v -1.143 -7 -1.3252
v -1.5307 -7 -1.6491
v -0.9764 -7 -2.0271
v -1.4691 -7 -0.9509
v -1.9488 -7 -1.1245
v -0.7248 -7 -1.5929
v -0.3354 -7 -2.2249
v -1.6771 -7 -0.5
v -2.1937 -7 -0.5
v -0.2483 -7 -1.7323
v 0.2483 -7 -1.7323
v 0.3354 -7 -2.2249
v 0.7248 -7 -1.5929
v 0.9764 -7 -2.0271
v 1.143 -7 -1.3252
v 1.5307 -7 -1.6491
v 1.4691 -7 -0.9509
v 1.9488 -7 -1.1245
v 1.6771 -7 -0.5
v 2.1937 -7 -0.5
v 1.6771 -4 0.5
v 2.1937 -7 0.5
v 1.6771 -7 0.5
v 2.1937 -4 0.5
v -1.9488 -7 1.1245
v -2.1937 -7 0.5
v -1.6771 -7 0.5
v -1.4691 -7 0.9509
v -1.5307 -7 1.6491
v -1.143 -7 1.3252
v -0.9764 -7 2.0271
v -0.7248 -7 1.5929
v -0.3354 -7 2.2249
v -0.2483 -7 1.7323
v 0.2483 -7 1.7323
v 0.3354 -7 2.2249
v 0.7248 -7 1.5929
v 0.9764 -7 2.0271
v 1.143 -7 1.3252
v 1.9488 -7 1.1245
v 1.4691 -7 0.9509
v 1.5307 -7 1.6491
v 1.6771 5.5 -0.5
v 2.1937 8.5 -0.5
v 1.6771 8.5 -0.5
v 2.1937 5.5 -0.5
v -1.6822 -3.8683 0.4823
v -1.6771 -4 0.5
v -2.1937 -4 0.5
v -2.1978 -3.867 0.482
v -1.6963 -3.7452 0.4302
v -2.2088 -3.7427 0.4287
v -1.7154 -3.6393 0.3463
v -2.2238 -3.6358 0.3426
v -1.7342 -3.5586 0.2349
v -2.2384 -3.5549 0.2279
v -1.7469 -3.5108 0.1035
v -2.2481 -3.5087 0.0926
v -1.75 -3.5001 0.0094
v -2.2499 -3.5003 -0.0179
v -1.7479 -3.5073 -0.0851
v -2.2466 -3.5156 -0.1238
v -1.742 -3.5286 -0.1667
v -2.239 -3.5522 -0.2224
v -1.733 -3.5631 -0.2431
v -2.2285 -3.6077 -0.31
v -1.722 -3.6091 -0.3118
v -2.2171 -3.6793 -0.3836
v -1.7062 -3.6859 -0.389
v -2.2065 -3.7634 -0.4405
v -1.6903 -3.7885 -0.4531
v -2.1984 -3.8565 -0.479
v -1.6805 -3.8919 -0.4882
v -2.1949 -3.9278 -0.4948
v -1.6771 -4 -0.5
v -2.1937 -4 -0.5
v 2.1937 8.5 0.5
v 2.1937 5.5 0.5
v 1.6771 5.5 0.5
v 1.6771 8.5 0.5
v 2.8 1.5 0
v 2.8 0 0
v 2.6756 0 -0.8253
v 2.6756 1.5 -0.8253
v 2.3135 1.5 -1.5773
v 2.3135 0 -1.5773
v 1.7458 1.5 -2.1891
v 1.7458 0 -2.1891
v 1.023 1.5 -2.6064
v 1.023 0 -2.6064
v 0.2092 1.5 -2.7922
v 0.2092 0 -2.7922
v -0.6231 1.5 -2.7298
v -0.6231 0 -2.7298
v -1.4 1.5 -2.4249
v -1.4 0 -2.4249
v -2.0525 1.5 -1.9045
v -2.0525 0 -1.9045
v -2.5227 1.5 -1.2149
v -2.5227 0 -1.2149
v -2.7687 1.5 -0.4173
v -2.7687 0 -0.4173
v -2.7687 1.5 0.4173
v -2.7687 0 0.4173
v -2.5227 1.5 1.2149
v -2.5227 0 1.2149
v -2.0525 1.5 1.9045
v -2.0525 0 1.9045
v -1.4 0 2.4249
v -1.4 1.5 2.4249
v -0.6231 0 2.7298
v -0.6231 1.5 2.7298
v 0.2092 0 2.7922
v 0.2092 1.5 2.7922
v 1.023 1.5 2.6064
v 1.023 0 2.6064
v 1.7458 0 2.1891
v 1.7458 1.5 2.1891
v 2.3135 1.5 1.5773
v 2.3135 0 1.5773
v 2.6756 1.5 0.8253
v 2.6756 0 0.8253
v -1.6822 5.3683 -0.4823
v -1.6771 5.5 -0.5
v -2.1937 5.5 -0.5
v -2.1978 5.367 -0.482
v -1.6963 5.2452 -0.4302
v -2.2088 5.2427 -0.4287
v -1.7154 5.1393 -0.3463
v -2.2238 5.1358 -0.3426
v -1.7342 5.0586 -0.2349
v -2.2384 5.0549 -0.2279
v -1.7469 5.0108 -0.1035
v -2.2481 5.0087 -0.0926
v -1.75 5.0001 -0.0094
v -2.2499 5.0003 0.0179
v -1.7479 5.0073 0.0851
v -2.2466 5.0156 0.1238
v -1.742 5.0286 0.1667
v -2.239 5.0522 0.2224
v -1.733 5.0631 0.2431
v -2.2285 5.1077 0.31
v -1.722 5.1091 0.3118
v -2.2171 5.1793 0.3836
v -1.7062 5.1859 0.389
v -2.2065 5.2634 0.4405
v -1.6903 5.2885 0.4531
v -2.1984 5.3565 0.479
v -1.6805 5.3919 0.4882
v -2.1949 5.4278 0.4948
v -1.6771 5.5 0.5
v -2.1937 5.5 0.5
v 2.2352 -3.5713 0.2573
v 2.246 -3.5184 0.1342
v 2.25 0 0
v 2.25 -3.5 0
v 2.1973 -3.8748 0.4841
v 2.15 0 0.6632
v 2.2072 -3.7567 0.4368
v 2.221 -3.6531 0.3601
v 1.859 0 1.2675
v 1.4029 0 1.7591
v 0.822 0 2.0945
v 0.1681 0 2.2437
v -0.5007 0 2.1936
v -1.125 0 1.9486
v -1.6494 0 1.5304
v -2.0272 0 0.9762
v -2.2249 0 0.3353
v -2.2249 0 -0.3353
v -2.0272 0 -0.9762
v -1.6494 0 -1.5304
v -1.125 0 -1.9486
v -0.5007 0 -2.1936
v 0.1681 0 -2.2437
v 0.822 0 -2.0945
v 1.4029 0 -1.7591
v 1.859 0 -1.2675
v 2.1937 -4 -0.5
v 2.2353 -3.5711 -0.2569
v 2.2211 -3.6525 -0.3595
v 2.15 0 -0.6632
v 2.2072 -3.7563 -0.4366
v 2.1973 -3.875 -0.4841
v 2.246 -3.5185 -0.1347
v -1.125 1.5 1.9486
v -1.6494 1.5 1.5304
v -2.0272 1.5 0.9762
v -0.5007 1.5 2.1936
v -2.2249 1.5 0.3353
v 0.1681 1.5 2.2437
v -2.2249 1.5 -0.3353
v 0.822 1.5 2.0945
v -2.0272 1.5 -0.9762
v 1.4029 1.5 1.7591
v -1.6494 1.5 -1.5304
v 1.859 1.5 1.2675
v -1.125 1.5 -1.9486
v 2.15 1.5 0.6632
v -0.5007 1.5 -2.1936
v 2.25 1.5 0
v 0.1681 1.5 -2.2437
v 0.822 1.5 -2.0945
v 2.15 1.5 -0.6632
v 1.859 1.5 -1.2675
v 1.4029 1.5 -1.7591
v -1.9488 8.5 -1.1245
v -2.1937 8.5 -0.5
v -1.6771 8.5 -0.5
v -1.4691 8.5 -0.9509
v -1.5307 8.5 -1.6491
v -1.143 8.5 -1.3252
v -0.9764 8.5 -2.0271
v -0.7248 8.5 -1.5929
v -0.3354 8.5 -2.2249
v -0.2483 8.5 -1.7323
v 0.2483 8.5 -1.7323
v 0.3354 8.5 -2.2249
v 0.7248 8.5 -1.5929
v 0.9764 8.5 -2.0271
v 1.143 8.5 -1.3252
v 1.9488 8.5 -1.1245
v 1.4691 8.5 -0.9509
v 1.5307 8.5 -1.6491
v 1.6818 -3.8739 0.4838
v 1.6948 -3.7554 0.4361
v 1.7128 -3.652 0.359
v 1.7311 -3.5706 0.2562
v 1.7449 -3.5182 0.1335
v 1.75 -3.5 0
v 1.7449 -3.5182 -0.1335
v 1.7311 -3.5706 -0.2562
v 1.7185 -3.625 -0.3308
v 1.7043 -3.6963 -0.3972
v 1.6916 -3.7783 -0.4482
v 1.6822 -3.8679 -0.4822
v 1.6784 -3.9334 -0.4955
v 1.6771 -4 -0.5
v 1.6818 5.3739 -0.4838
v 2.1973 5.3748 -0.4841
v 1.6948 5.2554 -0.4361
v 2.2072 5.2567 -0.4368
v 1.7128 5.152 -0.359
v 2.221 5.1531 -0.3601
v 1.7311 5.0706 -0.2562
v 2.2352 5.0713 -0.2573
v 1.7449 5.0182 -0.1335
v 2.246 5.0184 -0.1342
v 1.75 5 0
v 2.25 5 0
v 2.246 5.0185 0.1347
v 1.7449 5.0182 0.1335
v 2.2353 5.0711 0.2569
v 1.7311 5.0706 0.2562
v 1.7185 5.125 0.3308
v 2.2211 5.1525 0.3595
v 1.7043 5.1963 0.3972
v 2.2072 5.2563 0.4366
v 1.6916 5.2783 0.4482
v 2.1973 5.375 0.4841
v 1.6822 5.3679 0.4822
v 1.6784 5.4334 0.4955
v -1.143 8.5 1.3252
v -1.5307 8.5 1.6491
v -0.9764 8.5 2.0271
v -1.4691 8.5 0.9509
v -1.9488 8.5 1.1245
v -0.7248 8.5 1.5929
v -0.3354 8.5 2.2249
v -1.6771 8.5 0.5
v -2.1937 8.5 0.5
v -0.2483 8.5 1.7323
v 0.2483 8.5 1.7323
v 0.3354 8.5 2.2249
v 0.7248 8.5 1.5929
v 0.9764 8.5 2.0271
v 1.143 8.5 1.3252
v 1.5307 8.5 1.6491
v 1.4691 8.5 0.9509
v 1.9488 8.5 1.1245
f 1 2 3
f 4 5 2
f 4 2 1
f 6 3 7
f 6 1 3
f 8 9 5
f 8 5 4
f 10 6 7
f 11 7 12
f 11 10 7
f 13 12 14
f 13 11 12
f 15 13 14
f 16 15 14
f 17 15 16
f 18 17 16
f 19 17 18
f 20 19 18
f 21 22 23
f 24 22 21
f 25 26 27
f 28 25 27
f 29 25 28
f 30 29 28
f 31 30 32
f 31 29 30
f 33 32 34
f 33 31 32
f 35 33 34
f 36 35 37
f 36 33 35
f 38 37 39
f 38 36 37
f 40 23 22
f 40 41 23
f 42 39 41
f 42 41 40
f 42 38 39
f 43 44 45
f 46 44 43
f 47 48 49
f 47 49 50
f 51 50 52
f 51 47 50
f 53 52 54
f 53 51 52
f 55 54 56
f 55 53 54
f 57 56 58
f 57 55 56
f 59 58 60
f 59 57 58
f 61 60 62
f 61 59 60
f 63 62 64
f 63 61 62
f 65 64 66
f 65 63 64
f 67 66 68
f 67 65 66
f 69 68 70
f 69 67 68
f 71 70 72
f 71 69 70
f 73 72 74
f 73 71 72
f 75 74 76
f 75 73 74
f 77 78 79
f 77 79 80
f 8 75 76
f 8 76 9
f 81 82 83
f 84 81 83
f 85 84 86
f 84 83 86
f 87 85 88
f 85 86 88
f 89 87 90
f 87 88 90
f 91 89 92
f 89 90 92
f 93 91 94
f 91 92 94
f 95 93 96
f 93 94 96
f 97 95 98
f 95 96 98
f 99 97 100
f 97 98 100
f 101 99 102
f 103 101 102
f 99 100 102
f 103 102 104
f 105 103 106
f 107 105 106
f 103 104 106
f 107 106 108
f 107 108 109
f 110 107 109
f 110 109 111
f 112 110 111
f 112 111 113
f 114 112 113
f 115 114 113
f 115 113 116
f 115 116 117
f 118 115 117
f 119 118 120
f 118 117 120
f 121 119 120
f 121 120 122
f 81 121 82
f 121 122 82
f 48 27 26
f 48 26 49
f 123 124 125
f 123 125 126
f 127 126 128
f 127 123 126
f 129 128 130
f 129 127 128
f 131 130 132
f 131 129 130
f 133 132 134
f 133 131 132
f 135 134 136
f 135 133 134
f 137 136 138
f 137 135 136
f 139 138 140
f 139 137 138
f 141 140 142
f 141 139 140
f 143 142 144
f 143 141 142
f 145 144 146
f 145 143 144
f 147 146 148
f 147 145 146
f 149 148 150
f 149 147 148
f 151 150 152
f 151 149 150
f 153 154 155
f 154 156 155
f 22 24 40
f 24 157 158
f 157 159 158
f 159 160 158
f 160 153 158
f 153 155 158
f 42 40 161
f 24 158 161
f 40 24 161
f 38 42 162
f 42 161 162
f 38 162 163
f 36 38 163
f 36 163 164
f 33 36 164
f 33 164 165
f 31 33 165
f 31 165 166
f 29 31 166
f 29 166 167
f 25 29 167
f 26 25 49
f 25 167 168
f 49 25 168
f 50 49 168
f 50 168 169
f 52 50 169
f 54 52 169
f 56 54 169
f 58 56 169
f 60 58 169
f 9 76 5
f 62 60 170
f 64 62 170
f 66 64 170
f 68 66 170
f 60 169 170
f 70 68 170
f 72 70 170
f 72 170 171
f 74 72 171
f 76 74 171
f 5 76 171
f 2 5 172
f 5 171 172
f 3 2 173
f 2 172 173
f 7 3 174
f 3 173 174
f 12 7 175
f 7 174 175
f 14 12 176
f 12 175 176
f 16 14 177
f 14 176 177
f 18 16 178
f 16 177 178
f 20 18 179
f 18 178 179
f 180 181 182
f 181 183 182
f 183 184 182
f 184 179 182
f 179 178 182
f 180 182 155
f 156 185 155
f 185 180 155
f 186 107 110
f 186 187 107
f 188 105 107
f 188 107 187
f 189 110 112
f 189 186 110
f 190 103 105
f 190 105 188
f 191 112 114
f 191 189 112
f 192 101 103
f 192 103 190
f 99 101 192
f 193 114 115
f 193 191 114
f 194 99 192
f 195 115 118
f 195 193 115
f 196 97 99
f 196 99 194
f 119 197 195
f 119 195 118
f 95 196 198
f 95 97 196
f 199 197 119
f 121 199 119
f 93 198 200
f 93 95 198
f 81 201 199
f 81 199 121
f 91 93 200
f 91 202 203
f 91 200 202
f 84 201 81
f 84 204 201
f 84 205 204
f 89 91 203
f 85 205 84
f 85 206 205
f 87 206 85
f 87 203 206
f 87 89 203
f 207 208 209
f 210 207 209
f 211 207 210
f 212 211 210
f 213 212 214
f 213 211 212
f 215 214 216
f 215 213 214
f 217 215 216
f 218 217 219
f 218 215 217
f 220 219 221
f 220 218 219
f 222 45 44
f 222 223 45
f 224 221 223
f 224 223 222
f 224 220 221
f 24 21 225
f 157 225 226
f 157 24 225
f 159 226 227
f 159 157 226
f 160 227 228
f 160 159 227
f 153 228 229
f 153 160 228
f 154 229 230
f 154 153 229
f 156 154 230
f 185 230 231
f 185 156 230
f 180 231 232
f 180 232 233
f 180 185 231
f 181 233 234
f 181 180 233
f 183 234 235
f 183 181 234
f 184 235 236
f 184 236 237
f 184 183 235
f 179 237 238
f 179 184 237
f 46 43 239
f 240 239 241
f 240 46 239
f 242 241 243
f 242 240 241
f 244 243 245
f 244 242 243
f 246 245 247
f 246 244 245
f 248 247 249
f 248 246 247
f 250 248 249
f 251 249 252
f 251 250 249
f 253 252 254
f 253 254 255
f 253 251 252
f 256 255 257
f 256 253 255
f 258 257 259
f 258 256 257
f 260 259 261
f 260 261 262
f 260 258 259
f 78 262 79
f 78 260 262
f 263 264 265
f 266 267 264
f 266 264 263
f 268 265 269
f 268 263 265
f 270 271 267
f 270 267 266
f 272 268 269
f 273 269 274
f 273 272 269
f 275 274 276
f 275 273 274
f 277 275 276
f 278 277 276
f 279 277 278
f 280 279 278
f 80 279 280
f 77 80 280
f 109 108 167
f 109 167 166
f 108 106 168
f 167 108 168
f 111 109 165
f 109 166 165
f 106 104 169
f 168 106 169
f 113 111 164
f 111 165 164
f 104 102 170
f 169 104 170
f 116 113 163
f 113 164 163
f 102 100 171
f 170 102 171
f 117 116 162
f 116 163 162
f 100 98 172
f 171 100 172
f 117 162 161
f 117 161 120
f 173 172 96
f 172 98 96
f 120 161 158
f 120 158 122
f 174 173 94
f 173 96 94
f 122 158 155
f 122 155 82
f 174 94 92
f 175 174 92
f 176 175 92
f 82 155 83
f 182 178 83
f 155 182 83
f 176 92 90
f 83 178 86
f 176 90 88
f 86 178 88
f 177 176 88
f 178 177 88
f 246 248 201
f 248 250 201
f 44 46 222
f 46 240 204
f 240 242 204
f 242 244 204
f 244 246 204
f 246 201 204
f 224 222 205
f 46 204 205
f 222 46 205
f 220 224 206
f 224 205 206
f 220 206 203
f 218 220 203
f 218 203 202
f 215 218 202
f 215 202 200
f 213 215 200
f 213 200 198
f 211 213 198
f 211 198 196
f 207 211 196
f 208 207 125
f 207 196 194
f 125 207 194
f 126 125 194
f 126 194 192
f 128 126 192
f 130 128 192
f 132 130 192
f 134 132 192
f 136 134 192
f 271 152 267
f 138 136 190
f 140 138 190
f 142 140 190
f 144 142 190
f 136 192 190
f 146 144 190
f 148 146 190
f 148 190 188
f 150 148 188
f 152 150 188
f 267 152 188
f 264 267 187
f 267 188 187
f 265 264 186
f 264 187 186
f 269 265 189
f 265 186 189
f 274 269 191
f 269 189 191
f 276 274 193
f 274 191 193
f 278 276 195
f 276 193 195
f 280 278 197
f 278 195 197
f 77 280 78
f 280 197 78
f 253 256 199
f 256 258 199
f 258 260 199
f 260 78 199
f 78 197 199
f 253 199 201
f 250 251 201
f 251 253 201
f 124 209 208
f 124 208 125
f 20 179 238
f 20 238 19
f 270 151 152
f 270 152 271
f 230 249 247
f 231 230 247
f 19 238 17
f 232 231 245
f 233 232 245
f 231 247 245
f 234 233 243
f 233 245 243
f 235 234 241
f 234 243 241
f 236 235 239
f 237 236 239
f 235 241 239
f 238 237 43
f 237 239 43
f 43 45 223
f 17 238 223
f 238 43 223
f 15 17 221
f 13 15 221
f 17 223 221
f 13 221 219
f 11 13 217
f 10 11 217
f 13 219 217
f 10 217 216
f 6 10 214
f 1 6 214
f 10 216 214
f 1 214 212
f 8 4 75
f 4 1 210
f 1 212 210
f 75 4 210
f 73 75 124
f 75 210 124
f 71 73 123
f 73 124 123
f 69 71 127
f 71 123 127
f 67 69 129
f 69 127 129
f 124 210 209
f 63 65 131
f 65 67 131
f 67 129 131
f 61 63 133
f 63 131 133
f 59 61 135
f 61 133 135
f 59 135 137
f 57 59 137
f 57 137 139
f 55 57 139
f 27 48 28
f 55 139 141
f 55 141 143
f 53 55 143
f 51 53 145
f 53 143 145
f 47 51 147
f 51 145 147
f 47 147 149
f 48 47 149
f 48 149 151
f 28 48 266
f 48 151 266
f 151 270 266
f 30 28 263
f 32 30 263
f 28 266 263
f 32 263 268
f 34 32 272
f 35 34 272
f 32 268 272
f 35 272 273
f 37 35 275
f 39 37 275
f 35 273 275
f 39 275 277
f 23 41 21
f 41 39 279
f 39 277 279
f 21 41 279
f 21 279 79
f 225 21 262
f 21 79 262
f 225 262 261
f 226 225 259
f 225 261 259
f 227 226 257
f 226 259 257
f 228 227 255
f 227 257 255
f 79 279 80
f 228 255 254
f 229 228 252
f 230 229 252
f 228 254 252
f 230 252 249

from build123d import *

# Parameters (mm, degrees)
SKETCH1_R           = 2.8
BOSS_EXTRUDE1_DEPTH = 1.5
SKETCH2_R           = 2.25
BOSS_EXTRUDE2_DEPTH = 7
SKETCH3_R           = 2.25
BOSS_EXTRUDE3_DEPTH = 7
CUT_EXTRUDE1_DEPTH  = 103.8
SKETCH5_R           = 1.75
CUT_EXTRUDE2_DEPTH  = 108.0000001


with BuildPart() as part:
    # Sketch1 → Boss-Extrude1 (new body)
    with BuildSketch(Plane(origin=(0, 0, 0), x_dir=(1, 0, 0), z_dir=(0, 1, 0))):
        Circle(SKETCH1_R)
    extrude(amount=BOSS_EXTRUDE1_DEPTH)

    # Sketch2 → Boss-Extrude2 (add)
    with BuildSketch(Plane(origin=(0, 1.5, 0), x_dir=(1, 0, 0), z_dir=(0, 1, 0))):
        Circle(SKETCH2_R)
    extrude(amount=BOSS_EXTRUDE2_DEPTH)

    # Sketch3 → Boss-Extrude3 (add)
    with BuildSketch(Plane.XZ):
        Circle(SKETCH3_R)
    extrude(amount=BOSS_EXTRUDE3_DEPTH)

    # Sketch4 → Cut-Extrude1 (cut, through all)
    with BuildSketch(Plane(origin=(100, 0, 0), x_dir=(0, 0, -1), z_dir=(1, 0, 0))):
        with BuildLine():
            Line((-0.5, 5.5), (-0.5, 8.5))
            ThreePointArc((-0.5, 8.5), (0, 9), (0.5, 8.5))
            Line((0.5, 8.5), (0.5, 5.5))
            ThreePointArc((0.5, 5.5), (0, 5), (-0.5, 5.5))
        make_face()
        with BuildLine():
            Line((0.5, -4), (0.5, -7))
            ThreePointArc((0.5, -7), (0, -7.5), (-0.5, -7))
            Line((-0.5, -7), (-0.5, -4))
            ThreePointArc((-0.5, -4), (0, -3.5), (0.5, -4))
        make_face()
    extrude(amount=-CUT_EXTRUDE1_DEPTH, mode=Mode.SUBTRACT)

    # Sketch5 → Cut-Extrude2 (cut, through all)
    with BuildSketch(Plane(origin=(0, 100, 0), x_dir=(1, 0, 0), z_dir=(0, 1, 0))):
        Circle(SKETCH5_R)
    extrude(amount=-CUT_EXTRUDE2_DEPTH, mode=Mode.SUBTRACT)


solid = part.part
